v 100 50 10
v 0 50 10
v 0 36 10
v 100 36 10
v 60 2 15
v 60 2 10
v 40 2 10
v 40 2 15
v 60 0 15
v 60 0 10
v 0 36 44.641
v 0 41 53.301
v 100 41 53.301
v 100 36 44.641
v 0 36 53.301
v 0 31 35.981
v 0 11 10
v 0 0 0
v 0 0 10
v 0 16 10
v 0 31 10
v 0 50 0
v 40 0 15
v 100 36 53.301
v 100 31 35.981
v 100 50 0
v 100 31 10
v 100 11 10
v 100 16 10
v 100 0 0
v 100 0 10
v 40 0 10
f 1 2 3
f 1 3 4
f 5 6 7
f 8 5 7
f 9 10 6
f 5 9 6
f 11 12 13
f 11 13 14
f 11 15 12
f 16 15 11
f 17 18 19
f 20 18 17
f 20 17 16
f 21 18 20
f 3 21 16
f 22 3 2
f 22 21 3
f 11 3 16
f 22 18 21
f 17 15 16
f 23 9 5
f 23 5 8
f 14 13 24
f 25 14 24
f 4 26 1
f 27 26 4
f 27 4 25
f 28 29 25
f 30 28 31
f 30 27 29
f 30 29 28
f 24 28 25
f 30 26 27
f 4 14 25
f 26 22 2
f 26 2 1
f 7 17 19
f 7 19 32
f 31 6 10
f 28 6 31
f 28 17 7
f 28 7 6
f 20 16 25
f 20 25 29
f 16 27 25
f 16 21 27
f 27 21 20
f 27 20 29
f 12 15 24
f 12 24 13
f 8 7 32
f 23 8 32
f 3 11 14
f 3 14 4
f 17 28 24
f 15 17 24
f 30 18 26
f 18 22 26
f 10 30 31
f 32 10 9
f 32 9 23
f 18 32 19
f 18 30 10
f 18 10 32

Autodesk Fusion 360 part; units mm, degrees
sketch "Sketch1" plane through (0, 0, 0) normal (0, 0, 1) x (1, 0, 0)
  line L0 (0, 0) -> (0, 50)
  line L1 (0, 50) -> (100, 50)
  line L2 (100, 50) -> (100, 0)
  line L3 (100, 0) -> (0, 0)
  dimension "d2" = 50
  dimension "d3" = 100
  dimension "d4" = 50
extrude "Extrude1" add sketch "Sketch1" along normal blind 10
sketch "Sketch2" plane through (0, 0, 0) normal (1, 0, 0) x (0, 1, 0)
  line L0 (0, 10) -> (11, 10)
  line L1 (11, 10) -> (36, 53.3013) construction
  line L2 (11, 10) -> (36, 53.3013)
  line L3 (36, 53.3013) -> (41, 53.3013)
  line L4 (41, 53.3013) -> (16, 10)
  line L5 (16, 10) -> (11, 10)
  line L6 (41, 53.3013) -> (36, 44.641)
  line L7 (36, 44.641) -> (36, 10)
  line L8 (36, 10) -> (31, 10)
  line L9 (31, 10) -> (31, 35.9808)
  dimension "d7" = 11
  dimension "d10" = 50
  dimension "d11" = 5
  dimension "d12" = 10
  dimension "d13" = 5
extrude "Extrude2" add sketch "Sketch2" along normal blind 100
sketch "Sketch3" plane through (0, 0, 10) normal (0, 0, 1) x (-1, 0, 0)
  line L0 (-100, -11) -> (0, -11)
  line L1 (0, -11) -> (0, 0)
  line L2 (0, 0) -> (-100, 0)
  line L3 (-100, 0) -> (-100, -11)
  line L4 (-50, 0) -> (-60, 0)
  line L5 (-50, 0) -> (-40, 0)
  line L6 (-60, 0) -> (-60, -2)
  line L7 (-60, -2) -> (-40, -2)
  line L8 (-40, -2) -> (-40, 0)
  dimension "d16" = 10
  dimension "d17" = 10
  dimension "d18" = 2
extrude "Extrude3" add sketch "Sketch3" along normal blind 5 contours L2 L4 L5 L6 L7 L8
